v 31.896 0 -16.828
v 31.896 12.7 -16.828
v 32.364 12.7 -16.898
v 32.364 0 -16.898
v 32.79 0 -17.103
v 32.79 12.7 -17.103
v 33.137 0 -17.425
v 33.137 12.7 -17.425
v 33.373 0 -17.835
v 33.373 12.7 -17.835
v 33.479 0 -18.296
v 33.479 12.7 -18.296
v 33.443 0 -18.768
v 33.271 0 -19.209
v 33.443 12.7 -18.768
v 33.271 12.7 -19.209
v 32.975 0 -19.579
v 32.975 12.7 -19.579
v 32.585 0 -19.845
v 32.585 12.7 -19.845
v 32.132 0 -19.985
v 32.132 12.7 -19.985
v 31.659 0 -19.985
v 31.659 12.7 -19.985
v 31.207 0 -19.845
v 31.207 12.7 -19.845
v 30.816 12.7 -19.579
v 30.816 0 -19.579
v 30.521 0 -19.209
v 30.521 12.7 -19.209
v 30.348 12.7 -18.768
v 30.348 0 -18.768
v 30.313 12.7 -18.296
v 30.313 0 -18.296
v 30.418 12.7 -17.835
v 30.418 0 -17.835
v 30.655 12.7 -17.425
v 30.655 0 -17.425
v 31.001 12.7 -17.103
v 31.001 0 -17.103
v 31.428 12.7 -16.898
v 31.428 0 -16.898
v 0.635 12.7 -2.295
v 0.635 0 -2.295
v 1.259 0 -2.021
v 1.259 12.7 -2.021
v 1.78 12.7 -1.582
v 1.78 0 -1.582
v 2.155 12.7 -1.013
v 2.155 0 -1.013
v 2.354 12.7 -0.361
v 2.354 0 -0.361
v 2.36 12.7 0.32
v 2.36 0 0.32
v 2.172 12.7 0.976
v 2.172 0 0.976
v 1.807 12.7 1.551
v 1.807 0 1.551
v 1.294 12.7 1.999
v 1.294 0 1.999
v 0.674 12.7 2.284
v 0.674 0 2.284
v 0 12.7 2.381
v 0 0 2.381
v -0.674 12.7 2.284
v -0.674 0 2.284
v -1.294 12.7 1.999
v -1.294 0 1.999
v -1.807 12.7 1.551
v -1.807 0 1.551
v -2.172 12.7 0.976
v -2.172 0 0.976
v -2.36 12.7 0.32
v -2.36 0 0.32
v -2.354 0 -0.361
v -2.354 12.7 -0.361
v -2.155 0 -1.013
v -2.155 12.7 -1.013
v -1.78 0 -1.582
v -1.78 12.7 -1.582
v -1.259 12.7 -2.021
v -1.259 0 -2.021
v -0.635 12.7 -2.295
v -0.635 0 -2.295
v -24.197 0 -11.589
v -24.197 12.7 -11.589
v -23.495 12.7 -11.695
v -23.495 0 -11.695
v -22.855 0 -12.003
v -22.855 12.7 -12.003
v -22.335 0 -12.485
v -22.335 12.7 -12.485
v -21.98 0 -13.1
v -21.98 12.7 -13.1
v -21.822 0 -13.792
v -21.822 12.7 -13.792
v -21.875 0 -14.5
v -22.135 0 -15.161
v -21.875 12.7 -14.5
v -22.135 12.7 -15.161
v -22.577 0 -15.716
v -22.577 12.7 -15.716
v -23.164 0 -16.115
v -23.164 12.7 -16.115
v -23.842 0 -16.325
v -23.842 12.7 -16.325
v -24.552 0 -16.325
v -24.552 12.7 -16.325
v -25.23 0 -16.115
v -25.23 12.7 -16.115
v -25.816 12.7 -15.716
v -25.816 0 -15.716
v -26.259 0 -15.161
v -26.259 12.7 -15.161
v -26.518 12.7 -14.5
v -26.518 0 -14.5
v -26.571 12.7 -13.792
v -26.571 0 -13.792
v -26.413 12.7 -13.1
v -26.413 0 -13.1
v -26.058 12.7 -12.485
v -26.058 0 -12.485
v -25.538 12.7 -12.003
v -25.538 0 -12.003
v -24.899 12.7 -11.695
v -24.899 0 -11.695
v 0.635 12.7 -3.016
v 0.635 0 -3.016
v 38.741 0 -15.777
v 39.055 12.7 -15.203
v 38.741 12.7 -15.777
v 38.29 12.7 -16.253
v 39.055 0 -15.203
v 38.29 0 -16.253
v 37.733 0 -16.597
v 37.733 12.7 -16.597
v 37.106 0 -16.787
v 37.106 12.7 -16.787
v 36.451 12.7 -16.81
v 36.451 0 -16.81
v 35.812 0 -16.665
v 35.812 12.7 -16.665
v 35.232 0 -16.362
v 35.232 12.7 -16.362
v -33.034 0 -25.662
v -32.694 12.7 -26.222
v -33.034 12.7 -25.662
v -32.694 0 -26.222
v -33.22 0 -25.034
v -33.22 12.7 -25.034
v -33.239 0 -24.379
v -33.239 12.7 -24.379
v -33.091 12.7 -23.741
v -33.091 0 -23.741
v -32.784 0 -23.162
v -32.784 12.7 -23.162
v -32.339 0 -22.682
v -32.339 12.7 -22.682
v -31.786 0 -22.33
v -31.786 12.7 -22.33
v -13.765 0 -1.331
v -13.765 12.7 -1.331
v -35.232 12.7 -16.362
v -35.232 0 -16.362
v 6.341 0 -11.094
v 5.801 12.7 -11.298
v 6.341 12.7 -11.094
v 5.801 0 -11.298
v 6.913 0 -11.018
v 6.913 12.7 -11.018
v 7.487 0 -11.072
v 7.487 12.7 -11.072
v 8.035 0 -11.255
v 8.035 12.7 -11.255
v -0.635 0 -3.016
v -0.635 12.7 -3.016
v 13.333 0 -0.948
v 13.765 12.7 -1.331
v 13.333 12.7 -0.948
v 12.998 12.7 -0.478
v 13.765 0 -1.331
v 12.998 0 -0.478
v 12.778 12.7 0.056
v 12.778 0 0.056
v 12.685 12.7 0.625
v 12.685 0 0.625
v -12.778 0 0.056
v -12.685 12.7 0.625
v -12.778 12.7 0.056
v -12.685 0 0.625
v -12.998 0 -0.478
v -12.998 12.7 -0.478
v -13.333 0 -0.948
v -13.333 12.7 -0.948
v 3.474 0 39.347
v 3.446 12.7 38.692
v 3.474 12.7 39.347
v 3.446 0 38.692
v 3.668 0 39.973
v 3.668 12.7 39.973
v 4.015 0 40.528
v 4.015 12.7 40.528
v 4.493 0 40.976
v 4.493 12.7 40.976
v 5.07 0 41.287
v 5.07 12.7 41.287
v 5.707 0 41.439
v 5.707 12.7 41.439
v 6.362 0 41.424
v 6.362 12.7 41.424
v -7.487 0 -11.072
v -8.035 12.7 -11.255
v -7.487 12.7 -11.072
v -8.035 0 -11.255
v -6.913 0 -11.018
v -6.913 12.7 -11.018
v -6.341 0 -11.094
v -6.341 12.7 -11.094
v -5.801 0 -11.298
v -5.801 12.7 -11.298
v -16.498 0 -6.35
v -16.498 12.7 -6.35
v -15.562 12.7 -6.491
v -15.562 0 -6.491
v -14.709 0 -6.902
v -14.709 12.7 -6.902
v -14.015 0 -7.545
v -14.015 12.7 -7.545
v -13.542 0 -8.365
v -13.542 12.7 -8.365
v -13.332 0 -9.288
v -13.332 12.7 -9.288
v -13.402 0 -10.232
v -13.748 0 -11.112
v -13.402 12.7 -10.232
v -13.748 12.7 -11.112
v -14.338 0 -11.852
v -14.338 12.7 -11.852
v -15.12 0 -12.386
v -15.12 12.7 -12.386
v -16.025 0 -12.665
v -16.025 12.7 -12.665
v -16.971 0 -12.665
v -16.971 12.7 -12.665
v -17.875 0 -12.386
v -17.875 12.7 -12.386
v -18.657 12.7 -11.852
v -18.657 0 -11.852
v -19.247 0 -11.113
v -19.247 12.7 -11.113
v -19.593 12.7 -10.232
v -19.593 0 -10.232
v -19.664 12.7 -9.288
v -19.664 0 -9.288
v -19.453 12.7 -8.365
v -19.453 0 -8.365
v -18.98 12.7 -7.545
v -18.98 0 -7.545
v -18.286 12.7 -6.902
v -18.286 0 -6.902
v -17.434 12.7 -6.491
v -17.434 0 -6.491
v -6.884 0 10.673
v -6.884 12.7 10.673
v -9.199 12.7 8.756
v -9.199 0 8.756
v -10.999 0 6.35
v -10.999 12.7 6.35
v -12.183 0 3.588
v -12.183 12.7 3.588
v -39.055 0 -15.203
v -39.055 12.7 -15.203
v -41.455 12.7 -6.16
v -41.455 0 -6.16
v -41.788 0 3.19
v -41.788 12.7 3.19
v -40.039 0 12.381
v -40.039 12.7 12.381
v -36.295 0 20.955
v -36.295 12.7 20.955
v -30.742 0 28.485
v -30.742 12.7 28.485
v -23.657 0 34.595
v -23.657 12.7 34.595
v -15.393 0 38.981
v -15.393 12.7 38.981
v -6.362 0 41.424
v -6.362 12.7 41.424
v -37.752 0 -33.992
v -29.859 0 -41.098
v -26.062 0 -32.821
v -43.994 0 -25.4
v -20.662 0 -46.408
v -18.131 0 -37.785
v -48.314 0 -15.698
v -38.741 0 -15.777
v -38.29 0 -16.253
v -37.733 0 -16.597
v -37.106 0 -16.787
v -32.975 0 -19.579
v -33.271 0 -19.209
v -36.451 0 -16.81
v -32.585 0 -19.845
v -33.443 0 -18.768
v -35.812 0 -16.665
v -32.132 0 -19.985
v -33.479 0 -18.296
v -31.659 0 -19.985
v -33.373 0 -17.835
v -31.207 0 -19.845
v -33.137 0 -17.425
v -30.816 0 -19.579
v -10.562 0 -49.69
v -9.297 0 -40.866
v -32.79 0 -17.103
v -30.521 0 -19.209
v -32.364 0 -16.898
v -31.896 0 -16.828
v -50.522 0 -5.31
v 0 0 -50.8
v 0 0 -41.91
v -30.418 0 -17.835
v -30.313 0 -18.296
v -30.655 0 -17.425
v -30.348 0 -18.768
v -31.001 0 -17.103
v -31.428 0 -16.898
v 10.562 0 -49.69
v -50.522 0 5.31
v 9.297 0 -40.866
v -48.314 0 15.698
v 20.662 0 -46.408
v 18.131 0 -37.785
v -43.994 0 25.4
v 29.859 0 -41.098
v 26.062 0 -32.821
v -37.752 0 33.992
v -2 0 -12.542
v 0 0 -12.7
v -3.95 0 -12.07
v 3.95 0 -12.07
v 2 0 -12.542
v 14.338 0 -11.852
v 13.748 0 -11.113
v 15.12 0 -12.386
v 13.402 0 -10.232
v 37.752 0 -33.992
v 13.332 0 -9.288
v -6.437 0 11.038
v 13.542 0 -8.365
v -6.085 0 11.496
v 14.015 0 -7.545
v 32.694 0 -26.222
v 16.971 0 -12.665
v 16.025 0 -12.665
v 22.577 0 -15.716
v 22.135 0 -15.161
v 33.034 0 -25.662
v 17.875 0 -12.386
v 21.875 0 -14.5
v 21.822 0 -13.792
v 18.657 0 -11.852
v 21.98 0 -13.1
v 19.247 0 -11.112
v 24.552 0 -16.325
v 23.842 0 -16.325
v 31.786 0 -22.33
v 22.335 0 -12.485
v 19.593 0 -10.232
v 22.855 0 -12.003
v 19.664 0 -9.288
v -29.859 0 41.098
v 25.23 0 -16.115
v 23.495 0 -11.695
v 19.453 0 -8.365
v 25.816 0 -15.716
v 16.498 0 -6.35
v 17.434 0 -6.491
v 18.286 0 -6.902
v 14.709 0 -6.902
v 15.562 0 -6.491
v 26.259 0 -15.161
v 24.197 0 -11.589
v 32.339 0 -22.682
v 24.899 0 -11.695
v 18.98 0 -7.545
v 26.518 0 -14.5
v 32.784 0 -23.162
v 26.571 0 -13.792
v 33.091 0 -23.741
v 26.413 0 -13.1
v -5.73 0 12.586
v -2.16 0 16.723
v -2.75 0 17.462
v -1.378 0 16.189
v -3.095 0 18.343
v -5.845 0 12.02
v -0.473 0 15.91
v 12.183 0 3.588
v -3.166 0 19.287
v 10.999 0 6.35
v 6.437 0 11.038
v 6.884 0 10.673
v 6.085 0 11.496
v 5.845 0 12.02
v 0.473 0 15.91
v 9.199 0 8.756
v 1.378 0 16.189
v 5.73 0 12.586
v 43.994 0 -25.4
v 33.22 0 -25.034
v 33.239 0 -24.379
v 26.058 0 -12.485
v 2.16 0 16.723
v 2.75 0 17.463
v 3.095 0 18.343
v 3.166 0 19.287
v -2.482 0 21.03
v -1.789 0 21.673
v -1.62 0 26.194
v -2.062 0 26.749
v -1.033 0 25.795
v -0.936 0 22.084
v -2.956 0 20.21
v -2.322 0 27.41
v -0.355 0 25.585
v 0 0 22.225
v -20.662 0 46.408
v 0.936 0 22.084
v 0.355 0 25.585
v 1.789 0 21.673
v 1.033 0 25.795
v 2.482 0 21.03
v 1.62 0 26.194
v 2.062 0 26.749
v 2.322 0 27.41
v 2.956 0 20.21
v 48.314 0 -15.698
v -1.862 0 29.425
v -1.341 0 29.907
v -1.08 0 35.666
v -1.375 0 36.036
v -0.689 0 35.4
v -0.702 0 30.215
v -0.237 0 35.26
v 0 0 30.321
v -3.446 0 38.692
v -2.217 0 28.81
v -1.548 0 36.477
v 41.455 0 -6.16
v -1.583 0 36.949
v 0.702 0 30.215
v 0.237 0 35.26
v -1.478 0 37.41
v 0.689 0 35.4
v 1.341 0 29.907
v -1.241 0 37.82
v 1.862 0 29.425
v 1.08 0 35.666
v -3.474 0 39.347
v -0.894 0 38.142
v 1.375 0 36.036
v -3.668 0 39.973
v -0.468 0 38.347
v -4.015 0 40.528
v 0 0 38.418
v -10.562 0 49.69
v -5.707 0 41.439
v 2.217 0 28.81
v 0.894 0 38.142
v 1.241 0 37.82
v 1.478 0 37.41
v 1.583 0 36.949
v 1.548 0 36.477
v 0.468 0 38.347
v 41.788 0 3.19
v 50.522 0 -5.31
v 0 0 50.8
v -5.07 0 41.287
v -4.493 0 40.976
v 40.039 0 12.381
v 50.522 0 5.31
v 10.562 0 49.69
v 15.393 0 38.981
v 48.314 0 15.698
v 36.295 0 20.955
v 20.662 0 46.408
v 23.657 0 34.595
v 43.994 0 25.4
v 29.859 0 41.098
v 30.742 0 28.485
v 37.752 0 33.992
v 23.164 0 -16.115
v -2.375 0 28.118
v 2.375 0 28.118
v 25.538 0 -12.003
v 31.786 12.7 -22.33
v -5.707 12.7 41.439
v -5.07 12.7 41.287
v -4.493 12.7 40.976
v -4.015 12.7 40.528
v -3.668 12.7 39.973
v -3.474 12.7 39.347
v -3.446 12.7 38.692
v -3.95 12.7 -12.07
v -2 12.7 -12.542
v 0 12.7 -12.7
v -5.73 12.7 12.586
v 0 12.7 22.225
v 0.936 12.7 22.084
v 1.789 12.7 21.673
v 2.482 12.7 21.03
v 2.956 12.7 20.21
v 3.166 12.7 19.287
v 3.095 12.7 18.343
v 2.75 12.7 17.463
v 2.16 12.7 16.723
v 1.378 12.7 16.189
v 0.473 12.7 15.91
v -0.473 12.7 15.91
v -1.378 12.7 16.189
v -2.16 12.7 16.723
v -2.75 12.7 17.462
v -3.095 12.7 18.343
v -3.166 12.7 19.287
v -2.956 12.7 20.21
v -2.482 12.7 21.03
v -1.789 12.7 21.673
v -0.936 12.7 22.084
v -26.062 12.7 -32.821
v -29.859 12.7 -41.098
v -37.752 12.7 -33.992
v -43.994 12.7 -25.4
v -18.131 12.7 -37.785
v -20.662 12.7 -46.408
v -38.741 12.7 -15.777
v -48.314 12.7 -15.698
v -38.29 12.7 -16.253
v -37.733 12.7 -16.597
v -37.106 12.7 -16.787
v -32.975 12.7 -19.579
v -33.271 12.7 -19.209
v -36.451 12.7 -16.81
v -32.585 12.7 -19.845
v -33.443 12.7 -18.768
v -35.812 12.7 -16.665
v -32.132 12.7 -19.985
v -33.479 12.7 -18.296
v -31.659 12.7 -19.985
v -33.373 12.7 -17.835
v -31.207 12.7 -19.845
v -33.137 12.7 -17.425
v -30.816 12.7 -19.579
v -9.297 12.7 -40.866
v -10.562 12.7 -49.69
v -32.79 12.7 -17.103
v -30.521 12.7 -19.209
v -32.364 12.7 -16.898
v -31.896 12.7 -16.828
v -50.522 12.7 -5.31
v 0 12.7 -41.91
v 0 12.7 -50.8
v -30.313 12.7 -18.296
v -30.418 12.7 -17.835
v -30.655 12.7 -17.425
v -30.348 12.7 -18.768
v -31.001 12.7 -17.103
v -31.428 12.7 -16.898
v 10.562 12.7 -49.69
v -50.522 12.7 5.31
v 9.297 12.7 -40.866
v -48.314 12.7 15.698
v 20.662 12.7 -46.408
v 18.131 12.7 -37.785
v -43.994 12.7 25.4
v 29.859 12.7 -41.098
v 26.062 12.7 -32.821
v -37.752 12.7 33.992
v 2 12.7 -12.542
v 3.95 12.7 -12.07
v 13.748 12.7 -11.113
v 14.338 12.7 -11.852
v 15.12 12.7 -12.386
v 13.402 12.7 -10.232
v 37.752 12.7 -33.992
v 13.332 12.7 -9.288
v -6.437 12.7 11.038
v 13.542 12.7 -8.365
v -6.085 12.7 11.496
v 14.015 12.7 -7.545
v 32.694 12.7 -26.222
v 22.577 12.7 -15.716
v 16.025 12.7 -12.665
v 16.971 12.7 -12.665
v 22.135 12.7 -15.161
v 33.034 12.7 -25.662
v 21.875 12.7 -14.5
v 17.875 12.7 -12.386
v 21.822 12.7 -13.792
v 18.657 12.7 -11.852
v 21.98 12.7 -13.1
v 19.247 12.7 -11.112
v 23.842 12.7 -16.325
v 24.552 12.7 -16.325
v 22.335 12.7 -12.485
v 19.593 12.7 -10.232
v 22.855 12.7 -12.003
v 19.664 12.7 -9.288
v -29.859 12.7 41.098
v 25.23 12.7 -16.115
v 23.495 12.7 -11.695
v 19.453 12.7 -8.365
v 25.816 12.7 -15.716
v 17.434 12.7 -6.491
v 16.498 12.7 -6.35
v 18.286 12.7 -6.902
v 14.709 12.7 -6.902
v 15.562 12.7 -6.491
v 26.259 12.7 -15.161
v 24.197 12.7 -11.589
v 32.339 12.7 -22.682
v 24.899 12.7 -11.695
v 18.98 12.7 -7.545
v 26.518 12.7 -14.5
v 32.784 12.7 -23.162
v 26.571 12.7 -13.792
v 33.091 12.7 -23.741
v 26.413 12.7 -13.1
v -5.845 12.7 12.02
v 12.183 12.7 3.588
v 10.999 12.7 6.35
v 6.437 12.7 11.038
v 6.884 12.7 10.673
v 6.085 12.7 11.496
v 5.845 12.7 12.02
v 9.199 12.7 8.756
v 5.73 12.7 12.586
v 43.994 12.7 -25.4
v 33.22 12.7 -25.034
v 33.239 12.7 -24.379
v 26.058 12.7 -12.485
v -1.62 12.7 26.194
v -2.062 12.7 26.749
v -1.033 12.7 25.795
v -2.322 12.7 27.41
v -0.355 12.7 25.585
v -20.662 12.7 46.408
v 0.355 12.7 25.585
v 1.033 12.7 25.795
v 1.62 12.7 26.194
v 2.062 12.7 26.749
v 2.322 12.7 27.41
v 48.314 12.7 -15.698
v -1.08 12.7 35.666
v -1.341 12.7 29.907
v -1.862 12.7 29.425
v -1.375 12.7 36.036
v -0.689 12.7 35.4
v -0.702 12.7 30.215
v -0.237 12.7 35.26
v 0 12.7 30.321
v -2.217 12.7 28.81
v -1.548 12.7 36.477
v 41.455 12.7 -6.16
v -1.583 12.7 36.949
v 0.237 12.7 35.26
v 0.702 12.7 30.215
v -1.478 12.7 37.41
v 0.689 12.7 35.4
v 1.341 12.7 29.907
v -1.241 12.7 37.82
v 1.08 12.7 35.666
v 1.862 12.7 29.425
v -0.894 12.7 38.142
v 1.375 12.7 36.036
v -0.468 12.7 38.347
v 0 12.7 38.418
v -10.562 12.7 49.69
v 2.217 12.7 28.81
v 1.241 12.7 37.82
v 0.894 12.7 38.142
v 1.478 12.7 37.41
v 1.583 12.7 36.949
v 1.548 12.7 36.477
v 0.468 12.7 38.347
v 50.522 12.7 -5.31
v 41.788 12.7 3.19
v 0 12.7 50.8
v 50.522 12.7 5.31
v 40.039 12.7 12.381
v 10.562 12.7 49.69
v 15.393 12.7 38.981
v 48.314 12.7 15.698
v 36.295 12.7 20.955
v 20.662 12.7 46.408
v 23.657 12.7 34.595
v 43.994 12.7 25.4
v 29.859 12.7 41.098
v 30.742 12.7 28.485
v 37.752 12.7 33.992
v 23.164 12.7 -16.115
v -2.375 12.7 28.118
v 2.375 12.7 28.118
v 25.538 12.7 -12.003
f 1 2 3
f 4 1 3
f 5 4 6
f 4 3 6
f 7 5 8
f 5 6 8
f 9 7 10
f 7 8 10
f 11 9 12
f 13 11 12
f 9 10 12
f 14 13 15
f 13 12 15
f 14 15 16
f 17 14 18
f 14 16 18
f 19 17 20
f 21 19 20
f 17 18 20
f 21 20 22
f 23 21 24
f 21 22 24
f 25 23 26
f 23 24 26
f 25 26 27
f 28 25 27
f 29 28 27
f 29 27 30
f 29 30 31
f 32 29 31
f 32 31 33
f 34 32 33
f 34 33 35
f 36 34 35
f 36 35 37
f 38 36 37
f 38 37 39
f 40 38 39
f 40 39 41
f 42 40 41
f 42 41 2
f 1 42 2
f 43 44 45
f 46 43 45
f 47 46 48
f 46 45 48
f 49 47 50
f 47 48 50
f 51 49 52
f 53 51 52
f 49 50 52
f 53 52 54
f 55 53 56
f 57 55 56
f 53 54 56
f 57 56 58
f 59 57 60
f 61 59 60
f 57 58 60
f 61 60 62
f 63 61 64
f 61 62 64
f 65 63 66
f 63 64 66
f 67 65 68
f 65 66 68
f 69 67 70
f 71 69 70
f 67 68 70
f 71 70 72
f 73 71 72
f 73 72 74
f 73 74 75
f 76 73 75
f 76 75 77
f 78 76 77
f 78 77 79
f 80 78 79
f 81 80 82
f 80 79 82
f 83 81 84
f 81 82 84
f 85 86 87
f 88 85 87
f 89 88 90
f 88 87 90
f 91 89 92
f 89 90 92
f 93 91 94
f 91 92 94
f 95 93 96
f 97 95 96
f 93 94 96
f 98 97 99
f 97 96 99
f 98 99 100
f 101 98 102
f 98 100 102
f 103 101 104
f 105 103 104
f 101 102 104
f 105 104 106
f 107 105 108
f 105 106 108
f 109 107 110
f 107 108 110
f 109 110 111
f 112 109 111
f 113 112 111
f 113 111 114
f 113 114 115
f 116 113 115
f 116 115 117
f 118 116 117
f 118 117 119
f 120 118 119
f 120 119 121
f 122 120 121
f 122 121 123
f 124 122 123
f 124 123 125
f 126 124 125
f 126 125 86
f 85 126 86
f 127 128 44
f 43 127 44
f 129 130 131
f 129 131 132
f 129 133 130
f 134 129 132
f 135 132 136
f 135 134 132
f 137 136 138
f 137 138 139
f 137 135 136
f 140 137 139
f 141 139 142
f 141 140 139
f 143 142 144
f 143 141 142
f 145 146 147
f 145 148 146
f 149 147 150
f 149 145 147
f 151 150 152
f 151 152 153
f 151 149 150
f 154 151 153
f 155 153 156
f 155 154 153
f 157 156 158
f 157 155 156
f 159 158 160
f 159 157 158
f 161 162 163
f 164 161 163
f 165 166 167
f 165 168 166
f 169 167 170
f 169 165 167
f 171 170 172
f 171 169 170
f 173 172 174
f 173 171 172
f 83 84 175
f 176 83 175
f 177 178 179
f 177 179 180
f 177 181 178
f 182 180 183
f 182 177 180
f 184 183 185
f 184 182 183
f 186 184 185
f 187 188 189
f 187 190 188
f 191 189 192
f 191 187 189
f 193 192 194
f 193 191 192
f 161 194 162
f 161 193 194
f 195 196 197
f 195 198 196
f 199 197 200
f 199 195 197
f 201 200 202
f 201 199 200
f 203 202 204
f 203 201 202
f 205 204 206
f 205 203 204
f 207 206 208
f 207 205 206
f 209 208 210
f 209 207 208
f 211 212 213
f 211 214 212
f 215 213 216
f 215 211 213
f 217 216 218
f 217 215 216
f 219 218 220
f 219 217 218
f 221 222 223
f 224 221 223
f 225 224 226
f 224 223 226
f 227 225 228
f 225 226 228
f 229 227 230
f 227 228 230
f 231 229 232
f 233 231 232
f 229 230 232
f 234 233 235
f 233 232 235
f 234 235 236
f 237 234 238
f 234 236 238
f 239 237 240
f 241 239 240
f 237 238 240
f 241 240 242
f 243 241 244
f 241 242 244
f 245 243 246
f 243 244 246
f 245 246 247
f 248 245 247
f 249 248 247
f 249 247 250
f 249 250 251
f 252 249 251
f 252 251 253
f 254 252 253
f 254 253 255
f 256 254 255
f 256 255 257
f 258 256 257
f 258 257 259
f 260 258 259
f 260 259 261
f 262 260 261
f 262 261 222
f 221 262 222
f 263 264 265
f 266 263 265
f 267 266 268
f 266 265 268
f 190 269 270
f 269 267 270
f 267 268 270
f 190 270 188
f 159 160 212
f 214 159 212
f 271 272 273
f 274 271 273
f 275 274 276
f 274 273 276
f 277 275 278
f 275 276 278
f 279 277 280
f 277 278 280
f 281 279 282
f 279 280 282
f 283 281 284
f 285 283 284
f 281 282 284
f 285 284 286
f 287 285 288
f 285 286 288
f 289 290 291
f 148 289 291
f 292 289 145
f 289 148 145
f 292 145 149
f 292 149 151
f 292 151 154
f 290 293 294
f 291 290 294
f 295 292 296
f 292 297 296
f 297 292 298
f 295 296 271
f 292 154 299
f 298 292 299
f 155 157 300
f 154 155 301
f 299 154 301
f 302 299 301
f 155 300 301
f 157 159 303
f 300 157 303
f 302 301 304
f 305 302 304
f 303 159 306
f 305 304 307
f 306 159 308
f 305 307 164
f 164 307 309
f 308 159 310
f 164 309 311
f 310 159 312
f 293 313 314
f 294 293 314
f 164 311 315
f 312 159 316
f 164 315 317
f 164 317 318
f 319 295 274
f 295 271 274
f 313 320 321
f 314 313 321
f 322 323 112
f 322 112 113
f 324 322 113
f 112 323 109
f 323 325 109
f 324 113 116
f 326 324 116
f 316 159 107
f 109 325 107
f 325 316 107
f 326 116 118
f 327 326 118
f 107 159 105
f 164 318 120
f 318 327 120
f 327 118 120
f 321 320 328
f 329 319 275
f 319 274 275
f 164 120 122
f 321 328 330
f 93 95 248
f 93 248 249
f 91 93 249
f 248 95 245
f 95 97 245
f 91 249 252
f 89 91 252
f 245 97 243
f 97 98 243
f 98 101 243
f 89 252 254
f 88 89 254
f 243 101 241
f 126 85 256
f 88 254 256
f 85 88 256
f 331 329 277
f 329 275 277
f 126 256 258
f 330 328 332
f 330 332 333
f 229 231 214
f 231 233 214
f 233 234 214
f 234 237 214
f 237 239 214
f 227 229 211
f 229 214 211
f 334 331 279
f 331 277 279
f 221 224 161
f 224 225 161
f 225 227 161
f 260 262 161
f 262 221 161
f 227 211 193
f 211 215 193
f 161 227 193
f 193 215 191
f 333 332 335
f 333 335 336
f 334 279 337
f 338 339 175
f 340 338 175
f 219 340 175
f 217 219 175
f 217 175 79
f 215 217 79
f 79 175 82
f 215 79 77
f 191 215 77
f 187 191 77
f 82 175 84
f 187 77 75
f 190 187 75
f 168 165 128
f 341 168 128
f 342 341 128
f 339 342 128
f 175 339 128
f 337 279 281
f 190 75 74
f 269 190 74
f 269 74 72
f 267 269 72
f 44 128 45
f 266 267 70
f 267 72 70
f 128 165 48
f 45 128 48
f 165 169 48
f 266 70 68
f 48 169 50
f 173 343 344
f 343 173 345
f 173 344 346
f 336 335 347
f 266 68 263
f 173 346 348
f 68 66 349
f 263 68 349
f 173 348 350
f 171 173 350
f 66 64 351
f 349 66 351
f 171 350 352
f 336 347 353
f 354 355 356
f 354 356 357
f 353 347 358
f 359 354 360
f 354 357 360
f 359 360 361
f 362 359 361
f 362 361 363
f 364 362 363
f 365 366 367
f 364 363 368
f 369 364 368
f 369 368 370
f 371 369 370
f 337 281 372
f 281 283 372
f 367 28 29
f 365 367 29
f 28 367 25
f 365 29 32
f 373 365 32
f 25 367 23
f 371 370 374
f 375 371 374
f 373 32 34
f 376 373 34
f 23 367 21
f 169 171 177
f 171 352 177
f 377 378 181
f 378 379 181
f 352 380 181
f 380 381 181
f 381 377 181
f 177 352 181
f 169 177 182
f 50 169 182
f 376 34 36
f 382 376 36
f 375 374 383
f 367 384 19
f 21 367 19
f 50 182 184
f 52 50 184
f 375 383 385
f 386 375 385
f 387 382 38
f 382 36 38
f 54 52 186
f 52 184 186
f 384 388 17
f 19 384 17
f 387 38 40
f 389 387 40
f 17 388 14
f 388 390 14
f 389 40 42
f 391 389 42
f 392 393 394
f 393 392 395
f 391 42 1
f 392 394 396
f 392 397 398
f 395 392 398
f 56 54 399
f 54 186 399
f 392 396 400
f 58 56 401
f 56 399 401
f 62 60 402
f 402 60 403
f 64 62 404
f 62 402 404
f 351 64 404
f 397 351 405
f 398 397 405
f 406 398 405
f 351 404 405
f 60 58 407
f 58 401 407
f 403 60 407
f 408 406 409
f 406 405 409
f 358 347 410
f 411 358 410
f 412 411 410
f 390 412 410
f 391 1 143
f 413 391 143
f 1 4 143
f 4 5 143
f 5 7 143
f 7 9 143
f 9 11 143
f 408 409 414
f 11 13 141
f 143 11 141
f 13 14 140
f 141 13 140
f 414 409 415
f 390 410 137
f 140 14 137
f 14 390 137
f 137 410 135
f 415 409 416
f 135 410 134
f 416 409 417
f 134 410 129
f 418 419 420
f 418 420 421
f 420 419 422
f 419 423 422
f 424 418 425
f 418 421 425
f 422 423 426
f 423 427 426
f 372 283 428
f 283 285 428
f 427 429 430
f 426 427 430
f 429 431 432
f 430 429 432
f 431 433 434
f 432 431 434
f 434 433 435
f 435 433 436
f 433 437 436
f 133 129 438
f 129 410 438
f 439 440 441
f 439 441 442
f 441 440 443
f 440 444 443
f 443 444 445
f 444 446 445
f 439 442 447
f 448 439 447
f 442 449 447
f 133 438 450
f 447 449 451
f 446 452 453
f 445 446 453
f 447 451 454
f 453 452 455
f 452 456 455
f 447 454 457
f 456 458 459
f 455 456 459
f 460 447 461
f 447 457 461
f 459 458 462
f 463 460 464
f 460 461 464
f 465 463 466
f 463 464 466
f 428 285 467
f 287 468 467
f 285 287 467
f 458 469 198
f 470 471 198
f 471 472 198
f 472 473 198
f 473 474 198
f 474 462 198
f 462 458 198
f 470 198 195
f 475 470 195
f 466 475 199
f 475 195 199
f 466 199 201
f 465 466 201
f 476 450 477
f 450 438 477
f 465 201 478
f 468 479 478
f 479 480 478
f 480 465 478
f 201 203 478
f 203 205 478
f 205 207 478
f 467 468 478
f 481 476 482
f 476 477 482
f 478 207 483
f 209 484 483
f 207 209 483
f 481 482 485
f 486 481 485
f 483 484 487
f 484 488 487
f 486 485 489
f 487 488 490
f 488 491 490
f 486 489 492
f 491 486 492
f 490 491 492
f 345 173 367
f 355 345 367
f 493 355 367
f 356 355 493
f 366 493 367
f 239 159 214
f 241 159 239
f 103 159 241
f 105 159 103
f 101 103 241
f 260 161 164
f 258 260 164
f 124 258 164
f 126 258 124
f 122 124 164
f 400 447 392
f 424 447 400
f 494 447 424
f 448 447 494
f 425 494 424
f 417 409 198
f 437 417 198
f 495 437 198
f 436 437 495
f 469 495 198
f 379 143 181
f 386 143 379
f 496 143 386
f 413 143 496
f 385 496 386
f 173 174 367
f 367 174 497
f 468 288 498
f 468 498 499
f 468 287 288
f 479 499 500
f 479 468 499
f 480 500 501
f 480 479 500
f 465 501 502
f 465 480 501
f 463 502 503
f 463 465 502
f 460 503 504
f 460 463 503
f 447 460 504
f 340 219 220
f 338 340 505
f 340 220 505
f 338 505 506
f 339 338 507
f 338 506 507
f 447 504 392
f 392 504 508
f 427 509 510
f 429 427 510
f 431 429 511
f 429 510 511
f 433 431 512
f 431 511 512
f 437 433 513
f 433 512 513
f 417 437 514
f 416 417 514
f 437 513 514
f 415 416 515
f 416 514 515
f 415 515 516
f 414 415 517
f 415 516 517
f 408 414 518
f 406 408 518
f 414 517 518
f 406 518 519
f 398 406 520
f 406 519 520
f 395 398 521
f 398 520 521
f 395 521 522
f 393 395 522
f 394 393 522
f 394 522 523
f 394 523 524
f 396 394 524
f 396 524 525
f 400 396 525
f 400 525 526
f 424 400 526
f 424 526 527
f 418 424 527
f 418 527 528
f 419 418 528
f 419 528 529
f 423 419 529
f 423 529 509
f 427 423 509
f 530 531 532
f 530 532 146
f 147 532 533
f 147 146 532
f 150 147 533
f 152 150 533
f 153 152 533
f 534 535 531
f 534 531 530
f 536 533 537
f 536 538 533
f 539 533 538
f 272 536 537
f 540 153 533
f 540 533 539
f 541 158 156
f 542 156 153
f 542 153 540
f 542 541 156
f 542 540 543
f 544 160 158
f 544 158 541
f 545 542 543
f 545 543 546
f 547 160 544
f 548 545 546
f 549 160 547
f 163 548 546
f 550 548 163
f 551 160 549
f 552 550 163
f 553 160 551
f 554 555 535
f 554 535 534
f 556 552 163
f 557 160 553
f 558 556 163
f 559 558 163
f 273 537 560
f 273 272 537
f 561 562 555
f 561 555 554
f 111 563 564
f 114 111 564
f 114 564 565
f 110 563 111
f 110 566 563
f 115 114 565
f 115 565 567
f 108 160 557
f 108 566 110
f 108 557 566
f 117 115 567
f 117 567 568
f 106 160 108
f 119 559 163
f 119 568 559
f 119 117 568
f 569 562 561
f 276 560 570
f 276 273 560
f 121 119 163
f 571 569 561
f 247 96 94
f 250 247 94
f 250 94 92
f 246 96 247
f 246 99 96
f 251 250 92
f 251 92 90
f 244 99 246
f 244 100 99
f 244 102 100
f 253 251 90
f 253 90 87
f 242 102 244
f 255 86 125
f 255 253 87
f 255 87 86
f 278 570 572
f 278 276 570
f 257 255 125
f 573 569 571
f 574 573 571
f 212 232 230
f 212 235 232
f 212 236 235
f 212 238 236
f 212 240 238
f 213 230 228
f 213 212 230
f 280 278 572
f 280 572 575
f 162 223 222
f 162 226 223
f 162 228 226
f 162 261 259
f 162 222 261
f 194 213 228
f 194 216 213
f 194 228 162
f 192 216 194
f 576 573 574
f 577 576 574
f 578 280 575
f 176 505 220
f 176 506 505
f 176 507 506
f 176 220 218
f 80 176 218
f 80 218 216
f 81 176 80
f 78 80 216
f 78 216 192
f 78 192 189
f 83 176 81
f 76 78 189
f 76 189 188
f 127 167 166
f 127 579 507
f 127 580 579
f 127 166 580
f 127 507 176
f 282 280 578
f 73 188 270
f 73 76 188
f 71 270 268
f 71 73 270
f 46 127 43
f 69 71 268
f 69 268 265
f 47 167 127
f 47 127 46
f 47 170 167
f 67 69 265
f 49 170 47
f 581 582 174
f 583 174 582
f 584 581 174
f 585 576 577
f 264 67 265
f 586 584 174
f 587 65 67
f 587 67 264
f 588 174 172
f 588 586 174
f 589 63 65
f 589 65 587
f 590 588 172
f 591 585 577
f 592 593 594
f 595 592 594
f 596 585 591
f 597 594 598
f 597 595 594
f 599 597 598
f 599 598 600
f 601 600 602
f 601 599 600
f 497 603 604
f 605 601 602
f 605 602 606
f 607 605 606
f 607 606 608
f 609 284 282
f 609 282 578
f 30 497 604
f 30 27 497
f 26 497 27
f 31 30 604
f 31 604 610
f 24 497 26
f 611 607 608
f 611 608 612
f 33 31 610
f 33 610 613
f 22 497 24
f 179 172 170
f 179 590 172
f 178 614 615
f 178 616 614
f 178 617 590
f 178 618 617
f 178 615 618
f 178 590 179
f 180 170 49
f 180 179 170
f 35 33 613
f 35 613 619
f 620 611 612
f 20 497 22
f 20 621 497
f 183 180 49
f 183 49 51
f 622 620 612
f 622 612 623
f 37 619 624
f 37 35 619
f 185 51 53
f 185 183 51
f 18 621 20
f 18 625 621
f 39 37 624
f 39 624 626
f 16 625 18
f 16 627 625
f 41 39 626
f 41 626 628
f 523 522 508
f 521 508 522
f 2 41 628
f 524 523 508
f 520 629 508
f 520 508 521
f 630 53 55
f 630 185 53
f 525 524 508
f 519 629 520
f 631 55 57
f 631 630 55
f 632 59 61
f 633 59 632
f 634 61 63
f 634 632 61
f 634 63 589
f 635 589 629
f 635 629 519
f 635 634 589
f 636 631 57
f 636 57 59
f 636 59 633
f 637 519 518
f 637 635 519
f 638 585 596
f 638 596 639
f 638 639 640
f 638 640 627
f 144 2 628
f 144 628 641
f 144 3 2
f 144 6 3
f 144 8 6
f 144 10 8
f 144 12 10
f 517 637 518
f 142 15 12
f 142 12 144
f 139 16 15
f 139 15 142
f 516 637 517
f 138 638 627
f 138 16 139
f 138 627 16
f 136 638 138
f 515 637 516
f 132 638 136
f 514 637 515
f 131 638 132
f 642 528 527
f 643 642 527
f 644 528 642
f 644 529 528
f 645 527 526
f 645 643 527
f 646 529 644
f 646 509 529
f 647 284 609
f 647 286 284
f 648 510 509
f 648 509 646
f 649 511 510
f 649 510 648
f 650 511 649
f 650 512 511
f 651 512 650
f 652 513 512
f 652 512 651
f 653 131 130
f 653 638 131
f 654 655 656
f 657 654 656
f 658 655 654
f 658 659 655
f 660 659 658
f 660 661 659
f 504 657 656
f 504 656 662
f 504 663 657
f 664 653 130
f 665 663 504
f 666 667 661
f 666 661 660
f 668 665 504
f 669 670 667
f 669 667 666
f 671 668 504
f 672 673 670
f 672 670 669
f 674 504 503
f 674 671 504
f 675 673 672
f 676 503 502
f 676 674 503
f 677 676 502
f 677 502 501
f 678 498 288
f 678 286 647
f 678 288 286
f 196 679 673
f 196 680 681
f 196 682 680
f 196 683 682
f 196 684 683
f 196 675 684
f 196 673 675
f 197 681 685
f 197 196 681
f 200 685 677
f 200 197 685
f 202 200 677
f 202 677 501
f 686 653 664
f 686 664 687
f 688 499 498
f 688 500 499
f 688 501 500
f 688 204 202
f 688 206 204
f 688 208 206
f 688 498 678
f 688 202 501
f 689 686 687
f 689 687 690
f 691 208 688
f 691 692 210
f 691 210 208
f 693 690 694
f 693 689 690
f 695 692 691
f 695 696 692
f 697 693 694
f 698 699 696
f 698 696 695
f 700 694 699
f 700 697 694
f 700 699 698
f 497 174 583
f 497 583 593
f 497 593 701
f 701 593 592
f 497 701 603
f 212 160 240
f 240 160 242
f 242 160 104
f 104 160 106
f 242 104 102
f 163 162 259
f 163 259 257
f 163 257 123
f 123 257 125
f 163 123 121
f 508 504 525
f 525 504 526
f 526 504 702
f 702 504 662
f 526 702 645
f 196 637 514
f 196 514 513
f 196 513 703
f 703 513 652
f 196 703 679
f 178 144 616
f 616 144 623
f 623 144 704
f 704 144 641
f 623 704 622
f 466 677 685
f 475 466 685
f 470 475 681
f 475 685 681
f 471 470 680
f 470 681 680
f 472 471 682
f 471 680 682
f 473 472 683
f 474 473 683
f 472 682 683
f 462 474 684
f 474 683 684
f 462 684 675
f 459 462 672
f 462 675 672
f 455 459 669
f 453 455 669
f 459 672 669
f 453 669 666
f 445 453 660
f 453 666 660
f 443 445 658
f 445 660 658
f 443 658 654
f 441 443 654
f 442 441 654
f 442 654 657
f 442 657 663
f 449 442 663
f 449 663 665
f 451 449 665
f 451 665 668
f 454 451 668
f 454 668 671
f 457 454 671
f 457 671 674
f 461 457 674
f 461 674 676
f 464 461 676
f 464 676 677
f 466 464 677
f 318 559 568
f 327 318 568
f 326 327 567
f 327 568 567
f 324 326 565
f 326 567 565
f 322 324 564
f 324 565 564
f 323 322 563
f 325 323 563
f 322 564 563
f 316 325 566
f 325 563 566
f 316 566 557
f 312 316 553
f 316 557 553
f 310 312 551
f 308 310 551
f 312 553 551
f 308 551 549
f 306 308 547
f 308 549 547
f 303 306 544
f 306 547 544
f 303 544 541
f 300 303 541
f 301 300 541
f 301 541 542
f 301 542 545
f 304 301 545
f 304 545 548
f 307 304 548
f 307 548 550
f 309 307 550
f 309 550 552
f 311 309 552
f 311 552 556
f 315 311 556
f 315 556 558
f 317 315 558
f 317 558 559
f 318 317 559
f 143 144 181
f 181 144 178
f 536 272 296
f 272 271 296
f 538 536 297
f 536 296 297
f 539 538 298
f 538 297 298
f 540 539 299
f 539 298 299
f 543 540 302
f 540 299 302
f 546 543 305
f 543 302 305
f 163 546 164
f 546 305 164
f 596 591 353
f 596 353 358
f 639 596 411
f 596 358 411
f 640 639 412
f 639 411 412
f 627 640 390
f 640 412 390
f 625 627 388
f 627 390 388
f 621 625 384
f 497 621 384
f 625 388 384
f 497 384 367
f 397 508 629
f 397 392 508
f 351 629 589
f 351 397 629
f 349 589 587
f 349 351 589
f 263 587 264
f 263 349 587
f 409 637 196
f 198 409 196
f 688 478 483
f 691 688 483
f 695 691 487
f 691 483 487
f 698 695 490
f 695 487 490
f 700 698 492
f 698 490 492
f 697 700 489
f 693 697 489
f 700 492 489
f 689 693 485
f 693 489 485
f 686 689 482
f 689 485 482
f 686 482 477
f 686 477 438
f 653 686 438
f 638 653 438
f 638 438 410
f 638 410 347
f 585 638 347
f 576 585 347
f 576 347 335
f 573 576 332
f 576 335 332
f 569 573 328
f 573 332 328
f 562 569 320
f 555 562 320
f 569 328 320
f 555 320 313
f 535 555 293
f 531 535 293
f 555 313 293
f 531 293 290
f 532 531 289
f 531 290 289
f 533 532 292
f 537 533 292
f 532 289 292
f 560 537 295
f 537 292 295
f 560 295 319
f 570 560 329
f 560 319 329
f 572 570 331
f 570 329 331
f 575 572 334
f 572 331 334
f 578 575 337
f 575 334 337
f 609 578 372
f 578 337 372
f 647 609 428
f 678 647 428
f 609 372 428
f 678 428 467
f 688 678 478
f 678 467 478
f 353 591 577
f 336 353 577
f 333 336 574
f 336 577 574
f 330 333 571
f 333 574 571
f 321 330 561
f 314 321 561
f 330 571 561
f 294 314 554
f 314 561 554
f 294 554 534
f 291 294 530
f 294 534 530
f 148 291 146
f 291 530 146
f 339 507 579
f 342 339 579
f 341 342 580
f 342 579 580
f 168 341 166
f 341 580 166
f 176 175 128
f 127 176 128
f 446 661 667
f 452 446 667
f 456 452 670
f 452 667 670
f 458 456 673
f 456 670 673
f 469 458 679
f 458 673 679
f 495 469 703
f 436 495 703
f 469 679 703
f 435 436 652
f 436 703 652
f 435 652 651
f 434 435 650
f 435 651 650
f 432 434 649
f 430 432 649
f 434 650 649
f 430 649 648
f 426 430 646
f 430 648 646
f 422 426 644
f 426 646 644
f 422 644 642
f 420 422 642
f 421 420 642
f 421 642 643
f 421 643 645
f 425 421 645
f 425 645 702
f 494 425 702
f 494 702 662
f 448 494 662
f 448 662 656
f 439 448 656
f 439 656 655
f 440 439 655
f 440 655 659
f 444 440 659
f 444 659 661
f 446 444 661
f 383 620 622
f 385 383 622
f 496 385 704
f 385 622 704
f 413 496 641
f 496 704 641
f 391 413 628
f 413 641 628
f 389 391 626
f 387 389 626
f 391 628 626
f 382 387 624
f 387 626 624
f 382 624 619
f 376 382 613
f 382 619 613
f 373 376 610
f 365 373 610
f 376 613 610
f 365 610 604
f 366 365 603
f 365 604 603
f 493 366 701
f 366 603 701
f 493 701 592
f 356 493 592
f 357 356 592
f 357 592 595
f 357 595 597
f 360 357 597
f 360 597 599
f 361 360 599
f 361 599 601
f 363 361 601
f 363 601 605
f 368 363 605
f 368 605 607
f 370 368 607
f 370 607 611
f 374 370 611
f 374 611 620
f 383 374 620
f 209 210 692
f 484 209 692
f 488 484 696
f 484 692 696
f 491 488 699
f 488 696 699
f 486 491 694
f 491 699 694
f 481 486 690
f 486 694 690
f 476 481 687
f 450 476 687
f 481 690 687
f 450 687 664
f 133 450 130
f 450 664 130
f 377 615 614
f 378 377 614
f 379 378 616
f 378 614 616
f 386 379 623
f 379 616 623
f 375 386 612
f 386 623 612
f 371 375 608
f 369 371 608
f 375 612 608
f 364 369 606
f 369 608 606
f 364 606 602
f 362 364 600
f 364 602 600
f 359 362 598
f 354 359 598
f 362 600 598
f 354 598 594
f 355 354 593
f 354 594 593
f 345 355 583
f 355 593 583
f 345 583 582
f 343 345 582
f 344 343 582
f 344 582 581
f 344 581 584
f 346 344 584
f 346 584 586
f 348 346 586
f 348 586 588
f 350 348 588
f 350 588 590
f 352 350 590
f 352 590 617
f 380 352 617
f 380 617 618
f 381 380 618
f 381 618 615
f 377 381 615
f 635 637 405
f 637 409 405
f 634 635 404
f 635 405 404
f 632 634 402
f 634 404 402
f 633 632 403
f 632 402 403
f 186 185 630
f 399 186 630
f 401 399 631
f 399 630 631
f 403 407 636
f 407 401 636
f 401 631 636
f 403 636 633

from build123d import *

# Parameters (mm, degrees)
SKETCH1_R           = 50.8
BOSS_EXTRUDE1_DEPTH = 12.7
SKETCH2_R           = 3.175
SKETCH2_R_2         = 2.38125
SKETCH2_R_3         = 1.5875
CUT_EXTRUDE1_DEPTH  = 73.955945611
FILLET1_R           = 2.54


with BuildPart() as part:
    # Sketch1 → Boss-Extrude1 (new body)
    with BuildSketch(Plane(origin=(0, 0, 0), x_dir=(1, 0, 0), z_dir=(0, 1, 0))):
        with Locations(Location((0, 0, 0), (0, 0, 270))):
            Circle(SKETCH1_R)
        with BuildLine():
            Line((-0.635, 2.295022127), (-0.635, 3.01625))
            Line((-0.635, 3.01625), (0.635, 3.01625))
            Line((0.635, 3.01625), (0.635, 2.295022127))
            ThreePointArc((0.635, 2.295022127), (0, -2.38125), (-0.635, 2.295022127))
        make_face(mode=Mode.SUBTRACT)
    extrude(amount=BOSS_EXTRUDE1_DEPTH)

    # Sketch2 → Cut-Extrude1 (cut, through all)
    with BuildSketch(Plane(origin=(0, 12.7, 0), x_dir=(1, 0, 0), z_dir=(0, 1, 0))):
        with BuildLine():
            Line((5.844661521, -11.275190983), (3.175, -41.789561795))
            ThreePointArc((3.175, -41.789561795), (36.295124673, -20.955), (37.778322127, 18.14515024))
            Line((37.778322127, 18.14515024), (12.686932584, 0.575970138))
            ThreePointArc((12.686932584, 0.575970138), (10.998522628, -6.35), (5.844661521, -11.275190983))
        make_face()
        with BuildLine():
            ThreePointArc((-37.778322127, 18.14515024), (-36.295124673, -20.955), (-3.175, -41.789561795))
            Line((-3.175, -41.789561795), (-5.844661521, -11.275190983))
            ThreePointArc((-5.844661521, -11.275190983), (-10.998522628, -6.35), (-12.686932584, 0.575970138))
            Line((-12.686932584, 0.575970138), (-37.778322127, 18.14515024))
        make_face()
        with BuildLine():
            ThreePointArc((34.603322127, 23.644411554), (0, 41.91), (-34.603322127, 23.644411554))
            Line((-34.603322127, 23.644411554), (-6.842271064, 10.699220845))
            ThreePointArc((-6.842271064, 10.699220845), (-3.564400038, 12.189546848), (0, 12.7))
            ThreePointArc((0, 12.7), (3.564400038, 12.189546848), (6.842271064, 10.699220845))
            Line((6.842271064, 10.699220845), (34.603322127, 23.644411554))
        make_face()
        with Locations(Location((0, -19.05, 0), (0, 0, 270))):
            Circle(SKETCH2_R)
        with Locations(Location((0, -27.94, 0), (0, 0, 270))):
            Circle(SKETCH2_R_2)
        with Locations(Location((0, -36.83, 0), (0, 0, 270))):
            Circle(SKETCH2_R_3)
        with Locations(Location((-16.497783942, 9.525, 0), (0, 0, 270))):
            Circle(SKETCH2_R)
        with Locations(Location((-24.196749782, 13.97, 0), (0, 0, 270))):
            Circle(SKETCH2_R_2)
        with Locations(Location((-31.895715621, 18.415, 0), (0, 0, 270))):
            Circle(SKETCH2_R_3)
        with Locations(Location((16.497783942, 9.525, 0), (0, 0, 270))):
            Circle(SKETCH2_R)
        with Locations(Location((24.196749782, 13.97, 0), (0, 0, 270))):
            Circle(SKETCH2_R_2)
        with Locations(Location((31.895715621, 18.415, 0), (0, 0, 270))):
            Circle(SKETCH2_R_3)
    extrude(amount=-CUT_EXTRUDE1_DEPTH, mode=Mode.SUBTRACT)

    # Fillet1
    fillet1_edges = [part.edges().sort_by_distance(p)[0] for p in [
        (-37.778322127, 6.35, -18.14515024),
        (-12.686932584, 6.35, -0.575970138),
        (-5.844661521, 6.35, 11.275190983),
        (-3.175, 6.35, 41.789561795),
        (3.175, 6.35, 41.789561795),
        (5.844661521, 6.35, 11.275190983),
        (12.686932584, 6.35, -0.575970138),
        (37.778322127, 6.35, -18.14515024),
        (-34.603322127, 6.35, -23.644411554),
        (34.603322127, 6.35, -23.644411554),
        (6.842271064, 6.35, -10.699220845),
        (-6.842271064, 6.35, -10.699220845),
    ]]
    fillet(fillet1_edges, radius=FILLET1_R)


solid = part.part
